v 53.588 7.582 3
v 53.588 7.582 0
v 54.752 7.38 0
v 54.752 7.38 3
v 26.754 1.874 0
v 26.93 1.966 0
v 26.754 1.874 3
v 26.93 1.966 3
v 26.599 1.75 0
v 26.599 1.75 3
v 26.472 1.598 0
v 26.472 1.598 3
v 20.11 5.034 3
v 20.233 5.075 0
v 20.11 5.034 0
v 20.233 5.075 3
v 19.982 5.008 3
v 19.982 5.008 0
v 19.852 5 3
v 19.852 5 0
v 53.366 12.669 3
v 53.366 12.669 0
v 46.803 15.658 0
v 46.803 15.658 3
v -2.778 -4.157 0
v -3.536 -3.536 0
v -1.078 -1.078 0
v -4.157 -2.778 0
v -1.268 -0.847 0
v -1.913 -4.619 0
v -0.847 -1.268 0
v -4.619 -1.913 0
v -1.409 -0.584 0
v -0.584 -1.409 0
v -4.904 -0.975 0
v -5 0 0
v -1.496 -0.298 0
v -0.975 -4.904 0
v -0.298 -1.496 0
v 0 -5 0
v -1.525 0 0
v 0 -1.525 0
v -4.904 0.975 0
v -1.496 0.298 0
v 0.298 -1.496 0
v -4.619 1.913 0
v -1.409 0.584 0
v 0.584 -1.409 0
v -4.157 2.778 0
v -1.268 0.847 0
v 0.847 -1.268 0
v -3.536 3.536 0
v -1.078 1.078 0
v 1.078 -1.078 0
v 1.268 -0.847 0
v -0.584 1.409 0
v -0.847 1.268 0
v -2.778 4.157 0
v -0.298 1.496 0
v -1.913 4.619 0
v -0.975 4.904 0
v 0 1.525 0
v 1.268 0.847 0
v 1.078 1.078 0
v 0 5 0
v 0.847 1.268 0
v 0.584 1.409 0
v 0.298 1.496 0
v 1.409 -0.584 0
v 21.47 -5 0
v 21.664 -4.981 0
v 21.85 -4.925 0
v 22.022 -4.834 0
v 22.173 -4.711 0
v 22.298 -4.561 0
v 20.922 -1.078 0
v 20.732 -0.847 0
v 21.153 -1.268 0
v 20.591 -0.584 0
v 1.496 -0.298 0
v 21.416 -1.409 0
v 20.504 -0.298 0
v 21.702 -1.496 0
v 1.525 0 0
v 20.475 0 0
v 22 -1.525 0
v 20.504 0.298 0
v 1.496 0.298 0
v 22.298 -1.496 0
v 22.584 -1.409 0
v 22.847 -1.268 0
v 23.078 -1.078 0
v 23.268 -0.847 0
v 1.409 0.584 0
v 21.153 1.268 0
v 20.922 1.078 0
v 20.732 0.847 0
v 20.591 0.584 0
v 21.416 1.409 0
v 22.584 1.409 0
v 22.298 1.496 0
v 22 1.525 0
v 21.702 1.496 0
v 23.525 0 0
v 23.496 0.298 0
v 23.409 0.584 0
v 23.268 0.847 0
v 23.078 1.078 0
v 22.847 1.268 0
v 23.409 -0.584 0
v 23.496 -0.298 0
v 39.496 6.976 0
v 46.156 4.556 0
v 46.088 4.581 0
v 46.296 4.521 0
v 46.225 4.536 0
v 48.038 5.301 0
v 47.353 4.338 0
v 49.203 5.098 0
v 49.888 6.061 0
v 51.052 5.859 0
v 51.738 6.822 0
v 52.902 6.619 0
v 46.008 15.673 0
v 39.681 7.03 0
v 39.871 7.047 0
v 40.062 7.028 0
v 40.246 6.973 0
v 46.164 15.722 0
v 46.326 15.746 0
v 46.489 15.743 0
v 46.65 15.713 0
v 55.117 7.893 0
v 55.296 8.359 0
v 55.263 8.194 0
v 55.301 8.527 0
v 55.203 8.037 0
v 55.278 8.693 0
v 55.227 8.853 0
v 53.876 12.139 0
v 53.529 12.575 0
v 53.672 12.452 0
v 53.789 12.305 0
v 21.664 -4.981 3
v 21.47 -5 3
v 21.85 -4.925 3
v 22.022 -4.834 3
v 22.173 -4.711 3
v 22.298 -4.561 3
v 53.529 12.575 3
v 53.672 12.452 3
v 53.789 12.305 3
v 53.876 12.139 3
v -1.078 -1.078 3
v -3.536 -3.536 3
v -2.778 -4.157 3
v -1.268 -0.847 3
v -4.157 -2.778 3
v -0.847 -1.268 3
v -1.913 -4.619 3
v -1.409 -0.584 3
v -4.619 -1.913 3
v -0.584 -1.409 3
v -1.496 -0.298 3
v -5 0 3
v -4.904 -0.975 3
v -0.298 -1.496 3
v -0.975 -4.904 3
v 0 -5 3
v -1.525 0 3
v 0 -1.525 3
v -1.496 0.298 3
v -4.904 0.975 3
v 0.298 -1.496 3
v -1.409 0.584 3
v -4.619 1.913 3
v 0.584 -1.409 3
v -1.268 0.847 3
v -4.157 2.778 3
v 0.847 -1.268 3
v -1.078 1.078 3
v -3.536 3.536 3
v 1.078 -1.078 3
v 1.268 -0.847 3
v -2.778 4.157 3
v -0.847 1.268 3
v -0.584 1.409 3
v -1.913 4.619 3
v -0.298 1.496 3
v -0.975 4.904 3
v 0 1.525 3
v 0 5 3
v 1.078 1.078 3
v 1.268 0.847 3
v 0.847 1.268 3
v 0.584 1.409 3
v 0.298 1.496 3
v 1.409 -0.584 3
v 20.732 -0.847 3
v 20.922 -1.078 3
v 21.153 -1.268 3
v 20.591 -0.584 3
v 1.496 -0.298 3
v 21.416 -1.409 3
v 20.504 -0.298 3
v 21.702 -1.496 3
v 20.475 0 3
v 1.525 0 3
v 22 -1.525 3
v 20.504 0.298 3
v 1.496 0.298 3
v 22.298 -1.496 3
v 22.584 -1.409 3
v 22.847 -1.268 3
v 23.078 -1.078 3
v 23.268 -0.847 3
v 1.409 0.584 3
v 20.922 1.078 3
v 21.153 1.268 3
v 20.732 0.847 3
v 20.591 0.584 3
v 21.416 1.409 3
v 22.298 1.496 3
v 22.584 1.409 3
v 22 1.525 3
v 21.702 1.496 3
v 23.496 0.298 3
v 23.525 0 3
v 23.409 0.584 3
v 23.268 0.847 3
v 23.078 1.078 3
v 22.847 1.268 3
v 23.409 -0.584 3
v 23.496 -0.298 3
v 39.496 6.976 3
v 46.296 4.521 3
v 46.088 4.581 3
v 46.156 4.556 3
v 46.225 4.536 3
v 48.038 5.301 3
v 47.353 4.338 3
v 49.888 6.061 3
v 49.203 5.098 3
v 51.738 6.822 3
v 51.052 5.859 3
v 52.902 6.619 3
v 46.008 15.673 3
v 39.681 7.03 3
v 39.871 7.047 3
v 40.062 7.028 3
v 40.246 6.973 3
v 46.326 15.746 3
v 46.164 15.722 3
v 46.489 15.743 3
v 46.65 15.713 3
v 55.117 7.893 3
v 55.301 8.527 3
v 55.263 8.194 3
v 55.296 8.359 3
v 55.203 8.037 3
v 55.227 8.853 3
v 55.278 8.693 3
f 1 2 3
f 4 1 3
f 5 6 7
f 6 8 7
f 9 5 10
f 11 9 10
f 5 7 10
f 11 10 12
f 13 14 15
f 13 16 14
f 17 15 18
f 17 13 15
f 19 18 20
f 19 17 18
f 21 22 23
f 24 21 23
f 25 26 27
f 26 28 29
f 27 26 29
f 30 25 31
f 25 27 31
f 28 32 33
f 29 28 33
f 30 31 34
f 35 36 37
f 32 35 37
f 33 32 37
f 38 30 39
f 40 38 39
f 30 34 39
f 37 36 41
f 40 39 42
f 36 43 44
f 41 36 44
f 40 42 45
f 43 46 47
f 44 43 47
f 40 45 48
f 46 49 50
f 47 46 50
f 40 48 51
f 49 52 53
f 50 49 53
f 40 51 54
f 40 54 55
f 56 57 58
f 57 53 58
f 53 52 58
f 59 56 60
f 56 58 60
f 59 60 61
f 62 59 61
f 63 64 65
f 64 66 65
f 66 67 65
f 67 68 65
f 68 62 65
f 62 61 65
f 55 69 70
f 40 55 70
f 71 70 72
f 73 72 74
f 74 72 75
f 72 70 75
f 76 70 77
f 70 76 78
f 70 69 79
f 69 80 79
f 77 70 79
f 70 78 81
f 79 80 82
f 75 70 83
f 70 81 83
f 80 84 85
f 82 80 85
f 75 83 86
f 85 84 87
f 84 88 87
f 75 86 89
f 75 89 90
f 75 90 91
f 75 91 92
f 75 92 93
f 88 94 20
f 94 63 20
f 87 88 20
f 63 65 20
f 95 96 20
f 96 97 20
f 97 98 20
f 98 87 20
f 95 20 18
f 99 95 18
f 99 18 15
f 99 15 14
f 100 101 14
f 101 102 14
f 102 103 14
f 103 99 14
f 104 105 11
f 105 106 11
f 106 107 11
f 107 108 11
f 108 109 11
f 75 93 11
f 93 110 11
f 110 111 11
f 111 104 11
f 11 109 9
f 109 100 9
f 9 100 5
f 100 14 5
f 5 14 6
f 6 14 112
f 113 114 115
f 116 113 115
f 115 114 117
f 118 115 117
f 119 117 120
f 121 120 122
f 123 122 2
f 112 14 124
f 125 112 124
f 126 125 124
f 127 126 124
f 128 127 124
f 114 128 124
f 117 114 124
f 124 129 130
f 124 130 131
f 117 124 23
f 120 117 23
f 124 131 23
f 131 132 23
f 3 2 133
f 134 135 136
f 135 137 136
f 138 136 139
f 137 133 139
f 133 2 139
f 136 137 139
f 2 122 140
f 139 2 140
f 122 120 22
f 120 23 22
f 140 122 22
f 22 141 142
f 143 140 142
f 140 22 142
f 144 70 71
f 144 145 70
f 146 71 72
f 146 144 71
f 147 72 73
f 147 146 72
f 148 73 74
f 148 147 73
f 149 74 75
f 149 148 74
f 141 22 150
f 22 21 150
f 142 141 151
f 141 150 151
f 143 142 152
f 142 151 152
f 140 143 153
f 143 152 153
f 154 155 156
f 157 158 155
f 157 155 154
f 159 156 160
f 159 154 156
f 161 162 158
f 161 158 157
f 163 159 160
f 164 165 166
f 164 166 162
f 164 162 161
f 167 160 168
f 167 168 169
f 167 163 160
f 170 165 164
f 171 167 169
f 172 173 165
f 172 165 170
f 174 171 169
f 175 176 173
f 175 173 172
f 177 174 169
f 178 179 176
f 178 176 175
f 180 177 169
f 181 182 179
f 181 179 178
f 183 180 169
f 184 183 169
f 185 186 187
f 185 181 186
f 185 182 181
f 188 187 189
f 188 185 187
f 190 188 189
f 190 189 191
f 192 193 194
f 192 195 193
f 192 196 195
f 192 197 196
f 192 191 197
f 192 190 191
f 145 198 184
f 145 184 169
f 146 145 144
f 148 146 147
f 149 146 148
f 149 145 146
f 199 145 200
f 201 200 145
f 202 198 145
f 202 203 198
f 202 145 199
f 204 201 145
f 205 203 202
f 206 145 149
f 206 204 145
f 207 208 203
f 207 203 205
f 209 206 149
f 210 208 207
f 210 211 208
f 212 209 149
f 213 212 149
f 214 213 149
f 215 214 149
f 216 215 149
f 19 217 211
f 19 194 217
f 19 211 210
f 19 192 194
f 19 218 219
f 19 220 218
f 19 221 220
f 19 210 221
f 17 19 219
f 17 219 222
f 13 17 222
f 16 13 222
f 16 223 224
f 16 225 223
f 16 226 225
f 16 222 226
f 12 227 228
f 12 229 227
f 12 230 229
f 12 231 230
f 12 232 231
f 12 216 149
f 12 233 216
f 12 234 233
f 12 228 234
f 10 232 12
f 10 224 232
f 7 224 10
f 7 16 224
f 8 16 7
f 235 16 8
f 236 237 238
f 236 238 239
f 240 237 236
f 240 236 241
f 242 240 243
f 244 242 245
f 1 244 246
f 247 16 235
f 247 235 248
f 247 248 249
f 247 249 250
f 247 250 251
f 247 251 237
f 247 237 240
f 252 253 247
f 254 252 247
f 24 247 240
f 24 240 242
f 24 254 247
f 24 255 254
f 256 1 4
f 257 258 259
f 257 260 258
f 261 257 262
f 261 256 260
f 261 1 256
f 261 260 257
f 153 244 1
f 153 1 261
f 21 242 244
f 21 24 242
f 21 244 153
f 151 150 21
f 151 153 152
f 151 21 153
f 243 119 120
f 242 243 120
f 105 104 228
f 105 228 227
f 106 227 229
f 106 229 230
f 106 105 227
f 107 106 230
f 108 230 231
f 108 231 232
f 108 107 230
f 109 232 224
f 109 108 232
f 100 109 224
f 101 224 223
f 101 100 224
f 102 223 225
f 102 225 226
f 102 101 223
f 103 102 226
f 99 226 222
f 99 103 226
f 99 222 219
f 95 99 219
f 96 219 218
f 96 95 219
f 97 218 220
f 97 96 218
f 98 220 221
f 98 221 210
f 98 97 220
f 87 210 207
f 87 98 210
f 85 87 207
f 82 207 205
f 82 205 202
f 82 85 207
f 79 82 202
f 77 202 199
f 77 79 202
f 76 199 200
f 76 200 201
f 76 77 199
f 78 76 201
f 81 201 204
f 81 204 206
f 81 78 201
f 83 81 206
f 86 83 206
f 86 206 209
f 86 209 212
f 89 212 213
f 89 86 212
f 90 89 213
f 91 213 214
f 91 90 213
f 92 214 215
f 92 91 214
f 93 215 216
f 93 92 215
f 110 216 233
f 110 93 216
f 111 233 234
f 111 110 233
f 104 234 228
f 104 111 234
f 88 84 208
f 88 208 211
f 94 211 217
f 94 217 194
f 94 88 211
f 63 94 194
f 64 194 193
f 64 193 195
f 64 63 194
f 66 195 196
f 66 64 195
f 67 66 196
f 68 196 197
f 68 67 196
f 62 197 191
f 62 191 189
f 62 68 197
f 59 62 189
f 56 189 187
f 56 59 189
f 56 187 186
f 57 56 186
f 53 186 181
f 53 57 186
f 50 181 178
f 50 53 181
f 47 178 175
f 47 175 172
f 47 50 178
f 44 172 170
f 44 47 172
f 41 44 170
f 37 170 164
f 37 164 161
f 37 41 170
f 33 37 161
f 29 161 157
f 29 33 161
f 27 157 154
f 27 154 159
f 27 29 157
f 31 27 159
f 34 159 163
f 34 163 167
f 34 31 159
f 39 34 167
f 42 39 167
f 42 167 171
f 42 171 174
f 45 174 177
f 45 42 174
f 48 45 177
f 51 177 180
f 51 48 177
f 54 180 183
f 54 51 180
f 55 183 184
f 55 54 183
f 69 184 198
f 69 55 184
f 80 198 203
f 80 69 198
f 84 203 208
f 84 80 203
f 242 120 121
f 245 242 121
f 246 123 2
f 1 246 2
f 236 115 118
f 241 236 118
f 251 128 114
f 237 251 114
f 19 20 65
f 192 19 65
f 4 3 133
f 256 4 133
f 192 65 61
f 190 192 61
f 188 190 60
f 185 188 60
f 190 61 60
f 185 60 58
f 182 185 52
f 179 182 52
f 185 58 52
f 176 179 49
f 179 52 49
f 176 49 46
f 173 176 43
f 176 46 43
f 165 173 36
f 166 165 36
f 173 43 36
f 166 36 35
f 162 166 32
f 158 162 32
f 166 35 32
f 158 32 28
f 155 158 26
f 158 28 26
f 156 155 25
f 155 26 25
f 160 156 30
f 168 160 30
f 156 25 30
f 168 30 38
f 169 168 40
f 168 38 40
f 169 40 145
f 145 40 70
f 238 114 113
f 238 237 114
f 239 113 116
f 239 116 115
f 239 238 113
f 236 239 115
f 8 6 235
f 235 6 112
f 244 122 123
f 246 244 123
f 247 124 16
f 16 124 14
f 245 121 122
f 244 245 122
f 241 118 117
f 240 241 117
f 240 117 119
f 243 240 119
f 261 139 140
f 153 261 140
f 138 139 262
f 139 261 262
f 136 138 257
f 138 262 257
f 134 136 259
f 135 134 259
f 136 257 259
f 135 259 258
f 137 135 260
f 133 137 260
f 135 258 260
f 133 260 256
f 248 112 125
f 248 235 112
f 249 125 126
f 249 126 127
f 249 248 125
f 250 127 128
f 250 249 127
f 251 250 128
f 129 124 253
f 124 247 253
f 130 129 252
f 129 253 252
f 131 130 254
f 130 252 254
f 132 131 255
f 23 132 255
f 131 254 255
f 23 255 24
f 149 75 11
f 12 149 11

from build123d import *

# Parameters (mm, degrees)
SKETCH1_R           = 1.525
BOSS_EXTRUDE1_DEPTH = 3
FILLET1_R           = 1


with BuildPart() as part:
    # Sketch1 → Boss-Extrude1 (new body)
    # profile 1 of 2: a face of its own
    with BuildSketch(Plane.XY):
        with BuildLine():
            Line((20.05, 5), (0, 5))
            ThreePointArc((0, 5), (-5, 0), (0, -5))
            Line((0, -5), (22, -5))
            Line((22, -5), (26.644435765, 1.851814361))
            ThreePointArc((26.644435765, 1.851814361), (24.805434743, 4.138784351), (22, 5))
            Line((22, 5), (20.05, 5))
        make_face()
        Circle(SKETCH1_R, mode=Mode.SUBTRACT)
        with Locations((22, 0)):
            Circle(SKETCH1_R, mode=Mode.SUBTRACT)
    # profile 2 of 2: a face of its own
    with BuildSketch(Plane.XY):
        with BuildLine():
            Line((46.409029503, 15.837507263), (20.05, 5))
            Line((20.05, 5), (22, 5))
            ThreePointArc((22, 5), (24.805434743, 4.138784351), (26.644435765, 1.851814361))
            Line((26.644435765, 1.851814361), (39.871788822, 7.125781662))
            Line((39.871788822, 7.125781662), (46.188488025, 4.540007042))
            Line((46.188488025, 4.540007042), (47.352932204, 4.337597171))
            Line((47.352932204, 4.337597171), (48.038244482, 5.300533868))
            Line((48.038244482, 5.300533868), (49.20268866, 5.098123997))
            Line((49.20268866, 5.098123997), (49.888000938, 6.061060693))
            Line((49.888000938, 6.061060693), (51.052445116, 5.858650822))
            Line((51.052445116, 5.858650822), (51.737757394, 6.821587519))
            Line((51.737757394, 6.821587519), (52.902201573, 6.619177648))
            Line((52.902201573, 6.619177648), (53.587513851, 7.582114344))
            Line((53.587513851, 7.582114344), (54.751958029, 7.379704473))
            Line((54.751958029, 7.379704473), (55.437270307, 8.34264117))
            Line((55.437270307, 8.34264117), (53.72608495, 12.504593197))
            Line((53.72608495, 12.504593197), (46.409029503, 15.837507263))
        make_face()
    extrude(amount=BOSS_EXTRUDE1_DEPTH)

    # Fillet1
    fillet1_edges = [part.edges().sort_by_distance(p)[0] for p in [
        (22, -5, 1.5),
        (20.05, 5, 1.5),
        (46.409029503, 15.837507263, 1.5),
        (53.72608495, 12.504593197, 1.5),
        (55.437270307, 8.34264117, 1.5),
        (46.188488025, 4.540007042, 1.5),
        (39.871788822, 7.125781662, 1.5),
        (26.644435765, 1.851814361, 1.5),
    ]]
    fillet(fillet1_edges, radius=FILLET1_R)


solid = part.part
